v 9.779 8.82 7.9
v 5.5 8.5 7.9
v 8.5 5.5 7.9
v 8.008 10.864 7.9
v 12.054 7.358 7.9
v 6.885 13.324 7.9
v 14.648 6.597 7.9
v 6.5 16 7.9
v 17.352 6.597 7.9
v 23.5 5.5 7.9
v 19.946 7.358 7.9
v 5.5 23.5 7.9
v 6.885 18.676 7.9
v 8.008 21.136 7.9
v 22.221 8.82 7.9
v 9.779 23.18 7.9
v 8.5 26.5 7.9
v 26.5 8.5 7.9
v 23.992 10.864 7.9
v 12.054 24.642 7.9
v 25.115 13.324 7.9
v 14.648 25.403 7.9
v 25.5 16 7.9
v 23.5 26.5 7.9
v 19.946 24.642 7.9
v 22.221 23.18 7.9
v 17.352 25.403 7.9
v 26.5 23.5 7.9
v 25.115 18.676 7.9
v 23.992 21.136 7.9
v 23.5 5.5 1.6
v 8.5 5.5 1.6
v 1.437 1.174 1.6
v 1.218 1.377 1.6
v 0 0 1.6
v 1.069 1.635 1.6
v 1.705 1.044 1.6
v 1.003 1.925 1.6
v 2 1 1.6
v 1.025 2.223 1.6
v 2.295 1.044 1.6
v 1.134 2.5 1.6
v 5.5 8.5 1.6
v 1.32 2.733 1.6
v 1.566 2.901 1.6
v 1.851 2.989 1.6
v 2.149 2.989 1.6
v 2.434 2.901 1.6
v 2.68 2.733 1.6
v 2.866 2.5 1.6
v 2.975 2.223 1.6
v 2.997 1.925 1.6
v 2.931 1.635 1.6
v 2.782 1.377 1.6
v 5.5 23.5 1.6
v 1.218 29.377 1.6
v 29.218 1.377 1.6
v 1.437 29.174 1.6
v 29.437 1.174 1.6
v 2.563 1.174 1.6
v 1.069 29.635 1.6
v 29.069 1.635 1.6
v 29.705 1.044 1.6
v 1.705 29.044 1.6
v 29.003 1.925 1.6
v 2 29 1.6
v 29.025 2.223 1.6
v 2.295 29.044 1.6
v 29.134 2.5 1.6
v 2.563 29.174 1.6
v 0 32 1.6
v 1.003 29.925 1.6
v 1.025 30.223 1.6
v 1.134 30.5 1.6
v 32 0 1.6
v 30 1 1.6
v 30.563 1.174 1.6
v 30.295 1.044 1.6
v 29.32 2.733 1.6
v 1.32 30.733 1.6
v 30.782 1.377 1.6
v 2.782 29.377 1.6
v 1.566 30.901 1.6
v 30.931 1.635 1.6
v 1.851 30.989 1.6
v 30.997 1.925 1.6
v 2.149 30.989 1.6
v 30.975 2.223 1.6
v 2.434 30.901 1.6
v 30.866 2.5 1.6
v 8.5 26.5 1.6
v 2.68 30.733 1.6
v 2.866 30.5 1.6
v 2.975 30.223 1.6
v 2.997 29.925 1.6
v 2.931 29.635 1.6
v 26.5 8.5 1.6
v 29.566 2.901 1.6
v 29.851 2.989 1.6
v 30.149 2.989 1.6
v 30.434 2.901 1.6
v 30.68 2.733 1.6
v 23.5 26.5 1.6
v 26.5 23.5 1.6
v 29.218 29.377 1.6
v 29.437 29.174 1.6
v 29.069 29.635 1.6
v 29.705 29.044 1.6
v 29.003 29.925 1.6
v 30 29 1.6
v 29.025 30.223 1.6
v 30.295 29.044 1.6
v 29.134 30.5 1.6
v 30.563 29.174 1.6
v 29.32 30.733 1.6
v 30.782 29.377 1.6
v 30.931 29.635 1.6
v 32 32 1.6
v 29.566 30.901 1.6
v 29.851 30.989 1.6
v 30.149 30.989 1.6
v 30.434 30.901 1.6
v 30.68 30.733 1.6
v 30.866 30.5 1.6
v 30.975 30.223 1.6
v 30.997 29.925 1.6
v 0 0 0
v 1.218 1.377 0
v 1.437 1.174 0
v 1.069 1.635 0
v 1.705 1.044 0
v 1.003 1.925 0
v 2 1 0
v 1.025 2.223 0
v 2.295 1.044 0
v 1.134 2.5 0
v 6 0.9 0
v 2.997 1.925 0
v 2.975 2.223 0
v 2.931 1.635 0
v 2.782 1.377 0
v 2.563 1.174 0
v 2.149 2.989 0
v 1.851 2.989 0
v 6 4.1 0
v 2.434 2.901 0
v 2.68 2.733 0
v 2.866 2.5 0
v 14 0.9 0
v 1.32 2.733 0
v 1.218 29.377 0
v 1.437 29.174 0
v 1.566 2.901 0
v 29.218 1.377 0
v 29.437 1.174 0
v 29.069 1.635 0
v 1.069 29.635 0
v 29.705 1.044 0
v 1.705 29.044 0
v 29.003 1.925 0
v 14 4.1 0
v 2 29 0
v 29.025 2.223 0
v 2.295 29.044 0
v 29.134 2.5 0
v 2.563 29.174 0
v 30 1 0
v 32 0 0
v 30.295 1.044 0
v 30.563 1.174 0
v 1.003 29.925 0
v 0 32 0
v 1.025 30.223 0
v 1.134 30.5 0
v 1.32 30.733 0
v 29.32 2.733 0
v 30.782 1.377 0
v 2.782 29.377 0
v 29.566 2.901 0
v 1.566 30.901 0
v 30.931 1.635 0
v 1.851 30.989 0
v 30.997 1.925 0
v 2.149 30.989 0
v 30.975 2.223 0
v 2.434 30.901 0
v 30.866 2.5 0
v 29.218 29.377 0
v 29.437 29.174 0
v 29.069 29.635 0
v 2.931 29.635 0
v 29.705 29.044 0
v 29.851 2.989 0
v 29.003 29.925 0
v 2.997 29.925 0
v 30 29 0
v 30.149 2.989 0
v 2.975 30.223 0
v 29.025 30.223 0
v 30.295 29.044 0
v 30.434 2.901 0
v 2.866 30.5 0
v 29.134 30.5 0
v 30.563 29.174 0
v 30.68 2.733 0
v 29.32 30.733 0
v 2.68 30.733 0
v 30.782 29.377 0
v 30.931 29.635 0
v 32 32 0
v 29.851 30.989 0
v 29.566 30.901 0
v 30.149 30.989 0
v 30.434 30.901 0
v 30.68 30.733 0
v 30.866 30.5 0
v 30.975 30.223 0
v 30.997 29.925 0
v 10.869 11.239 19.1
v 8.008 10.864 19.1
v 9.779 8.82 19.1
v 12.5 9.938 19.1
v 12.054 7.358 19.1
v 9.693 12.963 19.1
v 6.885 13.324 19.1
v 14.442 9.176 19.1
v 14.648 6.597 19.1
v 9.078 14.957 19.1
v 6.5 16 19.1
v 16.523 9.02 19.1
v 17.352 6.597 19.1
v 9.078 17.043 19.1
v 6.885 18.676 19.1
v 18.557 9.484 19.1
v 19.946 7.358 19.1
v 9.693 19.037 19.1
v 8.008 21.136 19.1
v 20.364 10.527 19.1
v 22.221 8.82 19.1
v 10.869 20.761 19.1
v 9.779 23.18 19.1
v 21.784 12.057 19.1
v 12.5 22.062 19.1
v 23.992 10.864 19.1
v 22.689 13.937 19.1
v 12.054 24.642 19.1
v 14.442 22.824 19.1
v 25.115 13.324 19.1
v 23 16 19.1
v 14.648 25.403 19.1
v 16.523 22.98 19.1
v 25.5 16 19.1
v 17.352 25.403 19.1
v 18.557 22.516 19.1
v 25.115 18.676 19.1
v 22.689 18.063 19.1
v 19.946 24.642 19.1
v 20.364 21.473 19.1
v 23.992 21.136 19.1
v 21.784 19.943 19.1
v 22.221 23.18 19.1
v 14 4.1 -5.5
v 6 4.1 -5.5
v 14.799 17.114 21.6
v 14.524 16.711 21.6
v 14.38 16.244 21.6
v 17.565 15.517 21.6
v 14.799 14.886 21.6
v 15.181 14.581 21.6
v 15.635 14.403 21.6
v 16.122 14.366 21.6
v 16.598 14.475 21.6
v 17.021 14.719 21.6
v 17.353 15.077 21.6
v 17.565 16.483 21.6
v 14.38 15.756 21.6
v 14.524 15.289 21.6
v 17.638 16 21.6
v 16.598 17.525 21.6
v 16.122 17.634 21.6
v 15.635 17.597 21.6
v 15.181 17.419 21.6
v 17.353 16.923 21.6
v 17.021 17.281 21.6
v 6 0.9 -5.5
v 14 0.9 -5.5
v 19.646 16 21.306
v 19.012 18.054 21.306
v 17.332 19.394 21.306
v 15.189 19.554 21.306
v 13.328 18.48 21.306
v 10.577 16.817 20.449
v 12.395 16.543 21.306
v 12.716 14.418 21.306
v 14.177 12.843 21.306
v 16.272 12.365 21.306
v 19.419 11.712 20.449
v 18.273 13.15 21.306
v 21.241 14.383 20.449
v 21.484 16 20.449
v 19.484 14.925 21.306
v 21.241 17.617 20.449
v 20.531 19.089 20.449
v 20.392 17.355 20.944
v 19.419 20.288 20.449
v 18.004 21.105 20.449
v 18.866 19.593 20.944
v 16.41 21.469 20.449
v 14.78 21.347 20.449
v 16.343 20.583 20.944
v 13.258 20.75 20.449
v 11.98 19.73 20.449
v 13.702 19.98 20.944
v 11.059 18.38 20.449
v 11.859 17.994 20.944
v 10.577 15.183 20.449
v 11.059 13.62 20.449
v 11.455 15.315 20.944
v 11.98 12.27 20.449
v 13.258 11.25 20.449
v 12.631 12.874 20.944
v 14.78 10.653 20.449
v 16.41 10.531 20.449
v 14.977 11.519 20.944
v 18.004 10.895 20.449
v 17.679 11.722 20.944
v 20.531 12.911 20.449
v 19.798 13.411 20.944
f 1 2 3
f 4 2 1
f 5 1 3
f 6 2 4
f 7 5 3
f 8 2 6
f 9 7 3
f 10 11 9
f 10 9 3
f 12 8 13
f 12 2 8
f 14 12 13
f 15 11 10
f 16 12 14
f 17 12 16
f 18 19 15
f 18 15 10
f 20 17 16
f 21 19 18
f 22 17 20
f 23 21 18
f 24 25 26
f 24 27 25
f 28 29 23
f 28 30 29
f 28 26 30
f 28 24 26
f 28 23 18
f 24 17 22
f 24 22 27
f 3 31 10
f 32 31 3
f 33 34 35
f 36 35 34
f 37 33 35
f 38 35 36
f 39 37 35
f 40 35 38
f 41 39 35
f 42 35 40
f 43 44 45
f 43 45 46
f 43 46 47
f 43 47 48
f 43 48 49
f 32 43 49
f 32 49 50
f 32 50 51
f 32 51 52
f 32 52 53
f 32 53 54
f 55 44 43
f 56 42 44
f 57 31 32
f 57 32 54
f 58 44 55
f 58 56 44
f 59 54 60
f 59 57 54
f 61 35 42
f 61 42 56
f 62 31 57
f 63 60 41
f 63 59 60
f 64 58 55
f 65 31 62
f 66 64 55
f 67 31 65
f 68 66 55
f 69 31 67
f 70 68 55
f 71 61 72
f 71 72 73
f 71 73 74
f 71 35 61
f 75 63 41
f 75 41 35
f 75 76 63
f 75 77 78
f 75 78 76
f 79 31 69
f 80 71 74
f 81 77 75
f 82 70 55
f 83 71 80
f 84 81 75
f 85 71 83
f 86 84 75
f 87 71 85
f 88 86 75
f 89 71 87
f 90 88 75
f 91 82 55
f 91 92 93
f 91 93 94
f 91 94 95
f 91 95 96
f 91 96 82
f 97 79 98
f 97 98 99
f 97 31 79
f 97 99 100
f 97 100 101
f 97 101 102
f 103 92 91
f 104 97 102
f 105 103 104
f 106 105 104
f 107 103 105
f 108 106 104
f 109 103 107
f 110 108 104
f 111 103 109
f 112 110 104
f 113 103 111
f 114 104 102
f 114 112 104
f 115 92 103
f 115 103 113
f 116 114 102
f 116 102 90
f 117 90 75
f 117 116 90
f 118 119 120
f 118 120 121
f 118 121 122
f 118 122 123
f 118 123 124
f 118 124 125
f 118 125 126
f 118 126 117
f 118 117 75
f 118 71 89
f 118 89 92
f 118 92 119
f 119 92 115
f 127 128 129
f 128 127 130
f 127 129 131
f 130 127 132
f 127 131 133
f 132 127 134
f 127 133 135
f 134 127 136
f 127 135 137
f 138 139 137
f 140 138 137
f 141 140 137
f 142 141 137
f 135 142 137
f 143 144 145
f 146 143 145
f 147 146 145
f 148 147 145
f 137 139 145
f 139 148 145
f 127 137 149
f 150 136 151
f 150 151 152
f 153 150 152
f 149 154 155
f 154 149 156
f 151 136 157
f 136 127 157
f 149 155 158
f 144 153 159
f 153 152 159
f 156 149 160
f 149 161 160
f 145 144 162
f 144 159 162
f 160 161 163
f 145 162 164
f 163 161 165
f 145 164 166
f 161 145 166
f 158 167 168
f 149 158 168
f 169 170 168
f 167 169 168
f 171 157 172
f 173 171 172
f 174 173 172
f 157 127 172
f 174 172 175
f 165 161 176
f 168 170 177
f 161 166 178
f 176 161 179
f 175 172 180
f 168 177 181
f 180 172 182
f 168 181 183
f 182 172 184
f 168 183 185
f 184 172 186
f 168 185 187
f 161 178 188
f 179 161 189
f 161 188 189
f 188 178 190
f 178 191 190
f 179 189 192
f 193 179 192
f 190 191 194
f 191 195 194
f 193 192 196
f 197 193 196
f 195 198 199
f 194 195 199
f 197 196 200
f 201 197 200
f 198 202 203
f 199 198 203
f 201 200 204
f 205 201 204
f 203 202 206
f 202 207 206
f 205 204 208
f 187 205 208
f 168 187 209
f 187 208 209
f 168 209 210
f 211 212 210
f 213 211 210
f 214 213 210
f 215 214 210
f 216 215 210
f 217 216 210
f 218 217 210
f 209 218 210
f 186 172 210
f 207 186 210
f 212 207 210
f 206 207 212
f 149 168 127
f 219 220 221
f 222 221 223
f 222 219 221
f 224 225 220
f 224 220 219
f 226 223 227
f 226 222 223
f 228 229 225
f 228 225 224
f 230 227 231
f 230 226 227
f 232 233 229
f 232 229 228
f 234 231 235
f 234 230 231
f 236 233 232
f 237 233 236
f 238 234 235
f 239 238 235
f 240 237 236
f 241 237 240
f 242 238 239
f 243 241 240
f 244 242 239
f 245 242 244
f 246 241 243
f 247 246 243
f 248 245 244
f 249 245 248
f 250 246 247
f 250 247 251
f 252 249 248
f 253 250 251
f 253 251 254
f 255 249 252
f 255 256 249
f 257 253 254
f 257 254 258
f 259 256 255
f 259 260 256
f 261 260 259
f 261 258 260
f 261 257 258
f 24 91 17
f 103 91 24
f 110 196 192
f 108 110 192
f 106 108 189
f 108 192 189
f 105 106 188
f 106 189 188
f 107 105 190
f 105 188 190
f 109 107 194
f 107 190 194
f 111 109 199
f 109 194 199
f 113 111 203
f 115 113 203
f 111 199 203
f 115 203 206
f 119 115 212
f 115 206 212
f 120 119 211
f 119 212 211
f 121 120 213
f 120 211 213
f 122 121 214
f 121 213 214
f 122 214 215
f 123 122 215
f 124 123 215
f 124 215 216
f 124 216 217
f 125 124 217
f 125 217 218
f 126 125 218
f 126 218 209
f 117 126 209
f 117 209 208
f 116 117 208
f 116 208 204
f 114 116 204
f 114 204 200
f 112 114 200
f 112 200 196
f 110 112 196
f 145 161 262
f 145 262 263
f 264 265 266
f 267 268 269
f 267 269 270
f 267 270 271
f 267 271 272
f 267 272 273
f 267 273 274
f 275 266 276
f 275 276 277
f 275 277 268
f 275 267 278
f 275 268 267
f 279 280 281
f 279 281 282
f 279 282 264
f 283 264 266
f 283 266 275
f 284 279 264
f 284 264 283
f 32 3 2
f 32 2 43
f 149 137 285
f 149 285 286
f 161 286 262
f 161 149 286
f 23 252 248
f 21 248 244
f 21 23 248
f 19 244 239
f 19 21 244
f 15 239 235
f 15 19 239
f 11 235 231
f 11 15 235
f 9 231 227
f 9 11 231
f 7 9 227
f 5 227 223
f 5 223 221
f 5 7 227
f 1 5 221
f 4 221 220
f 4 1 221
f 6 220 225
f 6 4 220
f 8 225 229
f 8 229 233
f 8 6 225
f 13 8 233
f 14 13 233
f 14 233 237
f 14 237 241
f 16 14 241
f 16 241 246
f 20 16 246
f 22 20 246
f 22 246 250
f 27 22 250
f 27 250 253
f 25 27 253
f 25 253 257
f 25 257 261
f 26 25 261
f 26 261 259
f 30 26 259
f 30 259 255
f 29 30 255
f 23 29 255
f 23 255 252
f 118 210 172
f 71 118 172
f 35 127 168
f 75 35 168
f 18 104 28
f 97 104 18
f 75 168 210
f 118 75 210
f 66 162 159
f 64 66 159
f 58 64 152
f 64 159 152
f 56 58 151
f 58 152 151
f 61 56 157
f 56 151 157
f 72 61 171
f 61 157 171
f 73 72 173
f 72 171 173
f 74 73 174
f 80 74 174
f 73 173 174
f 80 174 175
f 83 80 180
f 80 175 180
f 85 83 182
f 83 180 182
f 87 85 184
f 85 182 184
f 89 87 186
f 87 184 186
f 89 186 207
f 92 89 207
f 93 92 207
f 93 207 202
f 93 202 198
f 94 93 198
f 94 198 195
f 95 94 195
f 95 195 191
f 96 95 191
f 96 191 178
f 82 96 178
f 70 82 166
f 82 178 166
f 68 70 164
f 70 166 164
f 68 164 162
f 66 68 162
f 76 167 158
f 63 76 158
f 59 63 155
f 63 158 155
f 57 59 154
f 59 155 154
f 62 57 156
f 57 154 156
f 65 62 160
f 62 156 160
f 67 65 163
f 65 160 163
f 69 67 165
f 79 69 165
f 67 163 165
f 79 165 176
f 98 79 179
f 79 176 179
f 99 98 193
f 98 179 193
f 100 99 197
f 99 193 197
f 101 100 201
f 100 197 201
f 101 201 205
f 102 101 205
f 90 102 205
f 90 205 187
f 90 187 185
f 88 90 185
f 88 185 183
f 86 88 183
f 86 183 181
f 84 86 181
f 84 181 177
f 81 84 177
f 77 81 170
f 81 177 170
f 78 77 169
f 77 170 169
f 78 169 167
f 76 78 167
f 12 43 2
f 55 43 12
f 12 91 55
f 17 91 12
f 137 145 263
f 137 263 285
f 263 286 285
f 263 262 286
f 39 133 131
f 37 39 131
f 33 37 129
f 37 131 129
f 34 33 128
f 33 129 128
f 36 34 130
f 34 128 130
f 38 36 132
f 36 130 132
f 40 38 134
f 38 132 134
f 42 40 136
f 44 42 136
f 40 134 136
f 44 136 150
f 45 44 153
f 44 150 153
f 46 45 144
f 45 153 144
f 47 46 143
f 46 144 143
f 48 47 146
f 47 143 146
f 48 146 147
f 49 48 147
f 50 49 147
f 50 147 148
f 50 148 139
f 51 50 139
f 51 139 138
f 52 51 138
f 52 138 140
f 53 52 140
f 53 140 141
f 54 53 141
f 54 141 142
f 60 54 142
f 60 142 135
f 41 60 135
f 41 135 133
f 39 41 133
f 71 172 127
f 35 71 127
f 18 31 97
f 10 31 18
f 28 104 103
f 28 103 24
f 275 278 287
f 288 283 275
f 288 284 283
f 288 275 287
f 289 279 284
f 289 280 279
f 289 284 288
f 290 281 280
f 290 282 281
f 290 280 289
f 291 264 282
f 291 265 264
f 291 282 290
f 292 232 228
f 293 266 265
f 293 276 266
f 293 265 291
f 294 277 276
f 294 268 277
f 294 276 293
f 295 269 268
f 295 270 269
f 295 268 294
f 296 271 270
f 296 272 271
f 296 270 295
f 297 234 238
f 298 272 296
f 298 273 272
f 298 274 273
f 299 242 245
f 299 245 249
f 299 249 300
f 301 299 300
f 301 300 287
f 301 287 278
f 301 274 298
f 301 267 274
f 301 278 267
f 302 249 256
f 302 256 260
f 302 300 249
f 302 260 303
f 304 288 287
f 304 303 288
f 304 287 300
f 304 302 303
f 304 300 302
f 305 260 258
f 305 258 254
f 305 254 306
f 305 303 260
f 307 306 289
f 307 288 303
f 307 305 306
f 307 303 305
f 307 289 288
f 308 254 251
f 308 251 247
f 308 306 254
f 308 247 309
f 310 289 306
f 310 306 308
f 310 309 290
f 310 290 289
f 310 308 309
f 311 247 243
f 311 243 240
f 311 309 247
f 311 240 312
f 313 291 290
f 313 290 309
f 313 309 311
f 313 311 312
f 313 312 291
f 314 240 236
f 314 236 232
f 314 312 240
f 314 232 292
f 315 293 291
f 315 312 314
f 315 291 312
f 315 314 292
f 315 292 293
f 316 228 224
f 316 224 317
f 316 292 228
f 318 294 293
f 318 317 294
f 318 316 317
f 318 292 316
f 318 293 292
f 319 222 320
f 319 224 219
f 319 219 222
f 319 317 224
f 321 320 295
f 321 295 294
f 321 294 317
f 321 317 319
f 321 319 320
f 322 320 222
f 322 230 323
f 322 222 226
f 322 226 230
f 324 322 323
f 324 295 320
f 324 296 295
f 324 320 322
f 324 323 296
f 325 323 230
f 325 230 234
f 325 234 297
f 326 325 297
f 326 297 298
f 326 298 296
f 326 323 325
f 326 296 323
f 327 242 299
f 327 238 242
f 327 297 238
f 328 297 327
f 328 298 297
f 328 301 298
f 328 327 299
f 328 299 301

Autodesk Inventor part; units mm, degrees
ref_plane "YZ Plane" through (0, 0, 0) normal (1, 0, 0) x (0, 1, 0)
ref_plane "XZ Plane" through (0, 0, 0) normal (0, 1, 0) x (-1, 0, 0)
ref_plane "XY Plane" through (0, 0, 0) normal (0, 0, 1) x (1, 0, 0)
sketch "スケッチ1" plane through (0, 0, 0) normal (0, 0, 1) x (1, 0, 0)
  line L0 (0, 0) -> (32, 0)
  line L1 (32, 0) -> (32, 32)
  line L2 (32, 32) -> (0, 32)
  line L3 (0, 32) -> (0, 0)
  dimension "d0" = 32
  dimension "d1" = 32
extrude "押し出し1" add sketch "スケッチ1" along normal blind 1.6
sketch "スケッチ2" plane through (0, 0, 1.6) normal (0, 0, 1) x (1, 0, 0)
  line L0 (0, 0) -> (32, 0) projected
  line L1 (32, 0) -> (32, 32) projected
  line L2 (32, 32) -> (0, 32) projected
  line L3 (0, 32) -> (0, 0) projected
  line L4 (30, 2) -> (2, 2)
  line L5 (2, 2) -> (2, 30)
  line L6 (2, 30) -> (30, 30)
  line L7 (30, 30) -> (30, 2)
  dimension "d4" = 28
hole "穴1" at (30, 30, 1.6) at (30, 2, 1.6) at (2, 2, 1.6) at (2, 30, 1.6) direction (0, 0, -1) diameter 2 end through all
sketch "スケッチ3" plane through (0, 0, 1.6) normal (0, 0, 1) x (1, 0, 0)
  line L0 (5.5, 26.5) -> (26.5, 26.5)
  line L1 (26.5, 26.5) -> (26.5, 5.5)
  line L2 (26.5, 5.5) -> (5.5, 5.5)
  line L3 (5.5, 5.5) -> (5.5, 26.5)
  circle A0 centre (2, 2) radius 1 projected
  circle A1 centre (30, 30) radius 1 projected
  circle A2 centre (30, 2) radius 1 projected
  circle A3 centre (2, 30) radius 1 projected
  line L4 (0, 0) -> (32, 0) projected
  line L5 (32, 0) -> (32, 32) projected
  line L6 (32, 32) -> (0, 32) projected
  line L7 (0, 32) -> (0, 0) projected
  line L8 (16, 26.5) -> (16, 32)
  line L9 (32, 32) -> (0, 32) projected
  line L10 (5.5, 16) -> (0, 16)
  line L11 (0, 32) -> (0, 0) projected
  dimension "d12" = 21
  dimension "d13" = 21
extrude "押し出し2" add sketch "スケッチ3" along normal blind 6.3 contours L0 L1 L2 L3
sketch "スケッチ4" plane through (0, 0, 7.9) normal (0, 0, 1) x (1, 0, 0)
  line L0 (5.5, 26.5) -> (5.5, 5.5) projected
  line L1 (5.5, 5.5) -> (26.5, 5.5) projected
  line L2 (26.5, 5.5) -> (26.5, 26.5) projected
  line L3 (26.5, 26.5) -> (5.5, 26.5) projected
  line L4 (5.5, 26.5) -> (26.5, 26.5) projected
  line L5 (16, 26.5) -> (16, 5.5)
  line L6 (5.5, 5.5) -> (26.5, 5.5) projected
  circle A0 centre (16, 16) radius 9.5
  point P0 (0, 0)
  dimension "d16" = 19
extrude "押し出し3" add sketch "スケッチ4" along normal blind 11.2 contours A0 L5 | L5 A0
sketch "スケッチ5" plane through (16, 16, 19.1) normal (0, 0, 1) x (1, 0, 0)
  circle A0 centre (0, 0) radius 9.5 projected
  circle A1 centre (0, 0) radius 7
  point P0 (-16, -16)
  dimension "d19" = 14
extrude "押し出し4" add sketch "スケッチ5" along normal blind 2.5 contours A1
fillet "フィレット1" radius 7 1 edges at (9, 16, 21.6)
sketch "スケッチ6" plane through (0, 0, 0) normal (0, 0, -1) x (-1, 0, 0)
  line L0 (-14, 4.1) -> (-6, 4.1)
  line L1 (-6, 4.1) -> (-6, 0.9)
  line L2 (-6, 0.9) -> (-14, 0.9)
  line L3 (-14, 0.9) -> (-14, 4.1)
  line L4 (0, 0) -> (-32, 0) projected
  line L5 (0, 32) -> (0, 0) projected
  dimension "d23" = 8
  dimension "d24" = 3.2
  dimension "d25" = 4.1
  dimension "d26" = 14
extrude "押し出し5" add sketch "スケッチ6" along normal blind 5.5
chamfer "面取り1" distance 3 angle 45 4 edges at (5.5, 5.5, 4.75) (26.5, 5.5, 4.75) (26.5, 26.5, 4.75) (5.5, 26.5, 4.75)
properties part number "超広角カメラ_MCM-4350FISH"
